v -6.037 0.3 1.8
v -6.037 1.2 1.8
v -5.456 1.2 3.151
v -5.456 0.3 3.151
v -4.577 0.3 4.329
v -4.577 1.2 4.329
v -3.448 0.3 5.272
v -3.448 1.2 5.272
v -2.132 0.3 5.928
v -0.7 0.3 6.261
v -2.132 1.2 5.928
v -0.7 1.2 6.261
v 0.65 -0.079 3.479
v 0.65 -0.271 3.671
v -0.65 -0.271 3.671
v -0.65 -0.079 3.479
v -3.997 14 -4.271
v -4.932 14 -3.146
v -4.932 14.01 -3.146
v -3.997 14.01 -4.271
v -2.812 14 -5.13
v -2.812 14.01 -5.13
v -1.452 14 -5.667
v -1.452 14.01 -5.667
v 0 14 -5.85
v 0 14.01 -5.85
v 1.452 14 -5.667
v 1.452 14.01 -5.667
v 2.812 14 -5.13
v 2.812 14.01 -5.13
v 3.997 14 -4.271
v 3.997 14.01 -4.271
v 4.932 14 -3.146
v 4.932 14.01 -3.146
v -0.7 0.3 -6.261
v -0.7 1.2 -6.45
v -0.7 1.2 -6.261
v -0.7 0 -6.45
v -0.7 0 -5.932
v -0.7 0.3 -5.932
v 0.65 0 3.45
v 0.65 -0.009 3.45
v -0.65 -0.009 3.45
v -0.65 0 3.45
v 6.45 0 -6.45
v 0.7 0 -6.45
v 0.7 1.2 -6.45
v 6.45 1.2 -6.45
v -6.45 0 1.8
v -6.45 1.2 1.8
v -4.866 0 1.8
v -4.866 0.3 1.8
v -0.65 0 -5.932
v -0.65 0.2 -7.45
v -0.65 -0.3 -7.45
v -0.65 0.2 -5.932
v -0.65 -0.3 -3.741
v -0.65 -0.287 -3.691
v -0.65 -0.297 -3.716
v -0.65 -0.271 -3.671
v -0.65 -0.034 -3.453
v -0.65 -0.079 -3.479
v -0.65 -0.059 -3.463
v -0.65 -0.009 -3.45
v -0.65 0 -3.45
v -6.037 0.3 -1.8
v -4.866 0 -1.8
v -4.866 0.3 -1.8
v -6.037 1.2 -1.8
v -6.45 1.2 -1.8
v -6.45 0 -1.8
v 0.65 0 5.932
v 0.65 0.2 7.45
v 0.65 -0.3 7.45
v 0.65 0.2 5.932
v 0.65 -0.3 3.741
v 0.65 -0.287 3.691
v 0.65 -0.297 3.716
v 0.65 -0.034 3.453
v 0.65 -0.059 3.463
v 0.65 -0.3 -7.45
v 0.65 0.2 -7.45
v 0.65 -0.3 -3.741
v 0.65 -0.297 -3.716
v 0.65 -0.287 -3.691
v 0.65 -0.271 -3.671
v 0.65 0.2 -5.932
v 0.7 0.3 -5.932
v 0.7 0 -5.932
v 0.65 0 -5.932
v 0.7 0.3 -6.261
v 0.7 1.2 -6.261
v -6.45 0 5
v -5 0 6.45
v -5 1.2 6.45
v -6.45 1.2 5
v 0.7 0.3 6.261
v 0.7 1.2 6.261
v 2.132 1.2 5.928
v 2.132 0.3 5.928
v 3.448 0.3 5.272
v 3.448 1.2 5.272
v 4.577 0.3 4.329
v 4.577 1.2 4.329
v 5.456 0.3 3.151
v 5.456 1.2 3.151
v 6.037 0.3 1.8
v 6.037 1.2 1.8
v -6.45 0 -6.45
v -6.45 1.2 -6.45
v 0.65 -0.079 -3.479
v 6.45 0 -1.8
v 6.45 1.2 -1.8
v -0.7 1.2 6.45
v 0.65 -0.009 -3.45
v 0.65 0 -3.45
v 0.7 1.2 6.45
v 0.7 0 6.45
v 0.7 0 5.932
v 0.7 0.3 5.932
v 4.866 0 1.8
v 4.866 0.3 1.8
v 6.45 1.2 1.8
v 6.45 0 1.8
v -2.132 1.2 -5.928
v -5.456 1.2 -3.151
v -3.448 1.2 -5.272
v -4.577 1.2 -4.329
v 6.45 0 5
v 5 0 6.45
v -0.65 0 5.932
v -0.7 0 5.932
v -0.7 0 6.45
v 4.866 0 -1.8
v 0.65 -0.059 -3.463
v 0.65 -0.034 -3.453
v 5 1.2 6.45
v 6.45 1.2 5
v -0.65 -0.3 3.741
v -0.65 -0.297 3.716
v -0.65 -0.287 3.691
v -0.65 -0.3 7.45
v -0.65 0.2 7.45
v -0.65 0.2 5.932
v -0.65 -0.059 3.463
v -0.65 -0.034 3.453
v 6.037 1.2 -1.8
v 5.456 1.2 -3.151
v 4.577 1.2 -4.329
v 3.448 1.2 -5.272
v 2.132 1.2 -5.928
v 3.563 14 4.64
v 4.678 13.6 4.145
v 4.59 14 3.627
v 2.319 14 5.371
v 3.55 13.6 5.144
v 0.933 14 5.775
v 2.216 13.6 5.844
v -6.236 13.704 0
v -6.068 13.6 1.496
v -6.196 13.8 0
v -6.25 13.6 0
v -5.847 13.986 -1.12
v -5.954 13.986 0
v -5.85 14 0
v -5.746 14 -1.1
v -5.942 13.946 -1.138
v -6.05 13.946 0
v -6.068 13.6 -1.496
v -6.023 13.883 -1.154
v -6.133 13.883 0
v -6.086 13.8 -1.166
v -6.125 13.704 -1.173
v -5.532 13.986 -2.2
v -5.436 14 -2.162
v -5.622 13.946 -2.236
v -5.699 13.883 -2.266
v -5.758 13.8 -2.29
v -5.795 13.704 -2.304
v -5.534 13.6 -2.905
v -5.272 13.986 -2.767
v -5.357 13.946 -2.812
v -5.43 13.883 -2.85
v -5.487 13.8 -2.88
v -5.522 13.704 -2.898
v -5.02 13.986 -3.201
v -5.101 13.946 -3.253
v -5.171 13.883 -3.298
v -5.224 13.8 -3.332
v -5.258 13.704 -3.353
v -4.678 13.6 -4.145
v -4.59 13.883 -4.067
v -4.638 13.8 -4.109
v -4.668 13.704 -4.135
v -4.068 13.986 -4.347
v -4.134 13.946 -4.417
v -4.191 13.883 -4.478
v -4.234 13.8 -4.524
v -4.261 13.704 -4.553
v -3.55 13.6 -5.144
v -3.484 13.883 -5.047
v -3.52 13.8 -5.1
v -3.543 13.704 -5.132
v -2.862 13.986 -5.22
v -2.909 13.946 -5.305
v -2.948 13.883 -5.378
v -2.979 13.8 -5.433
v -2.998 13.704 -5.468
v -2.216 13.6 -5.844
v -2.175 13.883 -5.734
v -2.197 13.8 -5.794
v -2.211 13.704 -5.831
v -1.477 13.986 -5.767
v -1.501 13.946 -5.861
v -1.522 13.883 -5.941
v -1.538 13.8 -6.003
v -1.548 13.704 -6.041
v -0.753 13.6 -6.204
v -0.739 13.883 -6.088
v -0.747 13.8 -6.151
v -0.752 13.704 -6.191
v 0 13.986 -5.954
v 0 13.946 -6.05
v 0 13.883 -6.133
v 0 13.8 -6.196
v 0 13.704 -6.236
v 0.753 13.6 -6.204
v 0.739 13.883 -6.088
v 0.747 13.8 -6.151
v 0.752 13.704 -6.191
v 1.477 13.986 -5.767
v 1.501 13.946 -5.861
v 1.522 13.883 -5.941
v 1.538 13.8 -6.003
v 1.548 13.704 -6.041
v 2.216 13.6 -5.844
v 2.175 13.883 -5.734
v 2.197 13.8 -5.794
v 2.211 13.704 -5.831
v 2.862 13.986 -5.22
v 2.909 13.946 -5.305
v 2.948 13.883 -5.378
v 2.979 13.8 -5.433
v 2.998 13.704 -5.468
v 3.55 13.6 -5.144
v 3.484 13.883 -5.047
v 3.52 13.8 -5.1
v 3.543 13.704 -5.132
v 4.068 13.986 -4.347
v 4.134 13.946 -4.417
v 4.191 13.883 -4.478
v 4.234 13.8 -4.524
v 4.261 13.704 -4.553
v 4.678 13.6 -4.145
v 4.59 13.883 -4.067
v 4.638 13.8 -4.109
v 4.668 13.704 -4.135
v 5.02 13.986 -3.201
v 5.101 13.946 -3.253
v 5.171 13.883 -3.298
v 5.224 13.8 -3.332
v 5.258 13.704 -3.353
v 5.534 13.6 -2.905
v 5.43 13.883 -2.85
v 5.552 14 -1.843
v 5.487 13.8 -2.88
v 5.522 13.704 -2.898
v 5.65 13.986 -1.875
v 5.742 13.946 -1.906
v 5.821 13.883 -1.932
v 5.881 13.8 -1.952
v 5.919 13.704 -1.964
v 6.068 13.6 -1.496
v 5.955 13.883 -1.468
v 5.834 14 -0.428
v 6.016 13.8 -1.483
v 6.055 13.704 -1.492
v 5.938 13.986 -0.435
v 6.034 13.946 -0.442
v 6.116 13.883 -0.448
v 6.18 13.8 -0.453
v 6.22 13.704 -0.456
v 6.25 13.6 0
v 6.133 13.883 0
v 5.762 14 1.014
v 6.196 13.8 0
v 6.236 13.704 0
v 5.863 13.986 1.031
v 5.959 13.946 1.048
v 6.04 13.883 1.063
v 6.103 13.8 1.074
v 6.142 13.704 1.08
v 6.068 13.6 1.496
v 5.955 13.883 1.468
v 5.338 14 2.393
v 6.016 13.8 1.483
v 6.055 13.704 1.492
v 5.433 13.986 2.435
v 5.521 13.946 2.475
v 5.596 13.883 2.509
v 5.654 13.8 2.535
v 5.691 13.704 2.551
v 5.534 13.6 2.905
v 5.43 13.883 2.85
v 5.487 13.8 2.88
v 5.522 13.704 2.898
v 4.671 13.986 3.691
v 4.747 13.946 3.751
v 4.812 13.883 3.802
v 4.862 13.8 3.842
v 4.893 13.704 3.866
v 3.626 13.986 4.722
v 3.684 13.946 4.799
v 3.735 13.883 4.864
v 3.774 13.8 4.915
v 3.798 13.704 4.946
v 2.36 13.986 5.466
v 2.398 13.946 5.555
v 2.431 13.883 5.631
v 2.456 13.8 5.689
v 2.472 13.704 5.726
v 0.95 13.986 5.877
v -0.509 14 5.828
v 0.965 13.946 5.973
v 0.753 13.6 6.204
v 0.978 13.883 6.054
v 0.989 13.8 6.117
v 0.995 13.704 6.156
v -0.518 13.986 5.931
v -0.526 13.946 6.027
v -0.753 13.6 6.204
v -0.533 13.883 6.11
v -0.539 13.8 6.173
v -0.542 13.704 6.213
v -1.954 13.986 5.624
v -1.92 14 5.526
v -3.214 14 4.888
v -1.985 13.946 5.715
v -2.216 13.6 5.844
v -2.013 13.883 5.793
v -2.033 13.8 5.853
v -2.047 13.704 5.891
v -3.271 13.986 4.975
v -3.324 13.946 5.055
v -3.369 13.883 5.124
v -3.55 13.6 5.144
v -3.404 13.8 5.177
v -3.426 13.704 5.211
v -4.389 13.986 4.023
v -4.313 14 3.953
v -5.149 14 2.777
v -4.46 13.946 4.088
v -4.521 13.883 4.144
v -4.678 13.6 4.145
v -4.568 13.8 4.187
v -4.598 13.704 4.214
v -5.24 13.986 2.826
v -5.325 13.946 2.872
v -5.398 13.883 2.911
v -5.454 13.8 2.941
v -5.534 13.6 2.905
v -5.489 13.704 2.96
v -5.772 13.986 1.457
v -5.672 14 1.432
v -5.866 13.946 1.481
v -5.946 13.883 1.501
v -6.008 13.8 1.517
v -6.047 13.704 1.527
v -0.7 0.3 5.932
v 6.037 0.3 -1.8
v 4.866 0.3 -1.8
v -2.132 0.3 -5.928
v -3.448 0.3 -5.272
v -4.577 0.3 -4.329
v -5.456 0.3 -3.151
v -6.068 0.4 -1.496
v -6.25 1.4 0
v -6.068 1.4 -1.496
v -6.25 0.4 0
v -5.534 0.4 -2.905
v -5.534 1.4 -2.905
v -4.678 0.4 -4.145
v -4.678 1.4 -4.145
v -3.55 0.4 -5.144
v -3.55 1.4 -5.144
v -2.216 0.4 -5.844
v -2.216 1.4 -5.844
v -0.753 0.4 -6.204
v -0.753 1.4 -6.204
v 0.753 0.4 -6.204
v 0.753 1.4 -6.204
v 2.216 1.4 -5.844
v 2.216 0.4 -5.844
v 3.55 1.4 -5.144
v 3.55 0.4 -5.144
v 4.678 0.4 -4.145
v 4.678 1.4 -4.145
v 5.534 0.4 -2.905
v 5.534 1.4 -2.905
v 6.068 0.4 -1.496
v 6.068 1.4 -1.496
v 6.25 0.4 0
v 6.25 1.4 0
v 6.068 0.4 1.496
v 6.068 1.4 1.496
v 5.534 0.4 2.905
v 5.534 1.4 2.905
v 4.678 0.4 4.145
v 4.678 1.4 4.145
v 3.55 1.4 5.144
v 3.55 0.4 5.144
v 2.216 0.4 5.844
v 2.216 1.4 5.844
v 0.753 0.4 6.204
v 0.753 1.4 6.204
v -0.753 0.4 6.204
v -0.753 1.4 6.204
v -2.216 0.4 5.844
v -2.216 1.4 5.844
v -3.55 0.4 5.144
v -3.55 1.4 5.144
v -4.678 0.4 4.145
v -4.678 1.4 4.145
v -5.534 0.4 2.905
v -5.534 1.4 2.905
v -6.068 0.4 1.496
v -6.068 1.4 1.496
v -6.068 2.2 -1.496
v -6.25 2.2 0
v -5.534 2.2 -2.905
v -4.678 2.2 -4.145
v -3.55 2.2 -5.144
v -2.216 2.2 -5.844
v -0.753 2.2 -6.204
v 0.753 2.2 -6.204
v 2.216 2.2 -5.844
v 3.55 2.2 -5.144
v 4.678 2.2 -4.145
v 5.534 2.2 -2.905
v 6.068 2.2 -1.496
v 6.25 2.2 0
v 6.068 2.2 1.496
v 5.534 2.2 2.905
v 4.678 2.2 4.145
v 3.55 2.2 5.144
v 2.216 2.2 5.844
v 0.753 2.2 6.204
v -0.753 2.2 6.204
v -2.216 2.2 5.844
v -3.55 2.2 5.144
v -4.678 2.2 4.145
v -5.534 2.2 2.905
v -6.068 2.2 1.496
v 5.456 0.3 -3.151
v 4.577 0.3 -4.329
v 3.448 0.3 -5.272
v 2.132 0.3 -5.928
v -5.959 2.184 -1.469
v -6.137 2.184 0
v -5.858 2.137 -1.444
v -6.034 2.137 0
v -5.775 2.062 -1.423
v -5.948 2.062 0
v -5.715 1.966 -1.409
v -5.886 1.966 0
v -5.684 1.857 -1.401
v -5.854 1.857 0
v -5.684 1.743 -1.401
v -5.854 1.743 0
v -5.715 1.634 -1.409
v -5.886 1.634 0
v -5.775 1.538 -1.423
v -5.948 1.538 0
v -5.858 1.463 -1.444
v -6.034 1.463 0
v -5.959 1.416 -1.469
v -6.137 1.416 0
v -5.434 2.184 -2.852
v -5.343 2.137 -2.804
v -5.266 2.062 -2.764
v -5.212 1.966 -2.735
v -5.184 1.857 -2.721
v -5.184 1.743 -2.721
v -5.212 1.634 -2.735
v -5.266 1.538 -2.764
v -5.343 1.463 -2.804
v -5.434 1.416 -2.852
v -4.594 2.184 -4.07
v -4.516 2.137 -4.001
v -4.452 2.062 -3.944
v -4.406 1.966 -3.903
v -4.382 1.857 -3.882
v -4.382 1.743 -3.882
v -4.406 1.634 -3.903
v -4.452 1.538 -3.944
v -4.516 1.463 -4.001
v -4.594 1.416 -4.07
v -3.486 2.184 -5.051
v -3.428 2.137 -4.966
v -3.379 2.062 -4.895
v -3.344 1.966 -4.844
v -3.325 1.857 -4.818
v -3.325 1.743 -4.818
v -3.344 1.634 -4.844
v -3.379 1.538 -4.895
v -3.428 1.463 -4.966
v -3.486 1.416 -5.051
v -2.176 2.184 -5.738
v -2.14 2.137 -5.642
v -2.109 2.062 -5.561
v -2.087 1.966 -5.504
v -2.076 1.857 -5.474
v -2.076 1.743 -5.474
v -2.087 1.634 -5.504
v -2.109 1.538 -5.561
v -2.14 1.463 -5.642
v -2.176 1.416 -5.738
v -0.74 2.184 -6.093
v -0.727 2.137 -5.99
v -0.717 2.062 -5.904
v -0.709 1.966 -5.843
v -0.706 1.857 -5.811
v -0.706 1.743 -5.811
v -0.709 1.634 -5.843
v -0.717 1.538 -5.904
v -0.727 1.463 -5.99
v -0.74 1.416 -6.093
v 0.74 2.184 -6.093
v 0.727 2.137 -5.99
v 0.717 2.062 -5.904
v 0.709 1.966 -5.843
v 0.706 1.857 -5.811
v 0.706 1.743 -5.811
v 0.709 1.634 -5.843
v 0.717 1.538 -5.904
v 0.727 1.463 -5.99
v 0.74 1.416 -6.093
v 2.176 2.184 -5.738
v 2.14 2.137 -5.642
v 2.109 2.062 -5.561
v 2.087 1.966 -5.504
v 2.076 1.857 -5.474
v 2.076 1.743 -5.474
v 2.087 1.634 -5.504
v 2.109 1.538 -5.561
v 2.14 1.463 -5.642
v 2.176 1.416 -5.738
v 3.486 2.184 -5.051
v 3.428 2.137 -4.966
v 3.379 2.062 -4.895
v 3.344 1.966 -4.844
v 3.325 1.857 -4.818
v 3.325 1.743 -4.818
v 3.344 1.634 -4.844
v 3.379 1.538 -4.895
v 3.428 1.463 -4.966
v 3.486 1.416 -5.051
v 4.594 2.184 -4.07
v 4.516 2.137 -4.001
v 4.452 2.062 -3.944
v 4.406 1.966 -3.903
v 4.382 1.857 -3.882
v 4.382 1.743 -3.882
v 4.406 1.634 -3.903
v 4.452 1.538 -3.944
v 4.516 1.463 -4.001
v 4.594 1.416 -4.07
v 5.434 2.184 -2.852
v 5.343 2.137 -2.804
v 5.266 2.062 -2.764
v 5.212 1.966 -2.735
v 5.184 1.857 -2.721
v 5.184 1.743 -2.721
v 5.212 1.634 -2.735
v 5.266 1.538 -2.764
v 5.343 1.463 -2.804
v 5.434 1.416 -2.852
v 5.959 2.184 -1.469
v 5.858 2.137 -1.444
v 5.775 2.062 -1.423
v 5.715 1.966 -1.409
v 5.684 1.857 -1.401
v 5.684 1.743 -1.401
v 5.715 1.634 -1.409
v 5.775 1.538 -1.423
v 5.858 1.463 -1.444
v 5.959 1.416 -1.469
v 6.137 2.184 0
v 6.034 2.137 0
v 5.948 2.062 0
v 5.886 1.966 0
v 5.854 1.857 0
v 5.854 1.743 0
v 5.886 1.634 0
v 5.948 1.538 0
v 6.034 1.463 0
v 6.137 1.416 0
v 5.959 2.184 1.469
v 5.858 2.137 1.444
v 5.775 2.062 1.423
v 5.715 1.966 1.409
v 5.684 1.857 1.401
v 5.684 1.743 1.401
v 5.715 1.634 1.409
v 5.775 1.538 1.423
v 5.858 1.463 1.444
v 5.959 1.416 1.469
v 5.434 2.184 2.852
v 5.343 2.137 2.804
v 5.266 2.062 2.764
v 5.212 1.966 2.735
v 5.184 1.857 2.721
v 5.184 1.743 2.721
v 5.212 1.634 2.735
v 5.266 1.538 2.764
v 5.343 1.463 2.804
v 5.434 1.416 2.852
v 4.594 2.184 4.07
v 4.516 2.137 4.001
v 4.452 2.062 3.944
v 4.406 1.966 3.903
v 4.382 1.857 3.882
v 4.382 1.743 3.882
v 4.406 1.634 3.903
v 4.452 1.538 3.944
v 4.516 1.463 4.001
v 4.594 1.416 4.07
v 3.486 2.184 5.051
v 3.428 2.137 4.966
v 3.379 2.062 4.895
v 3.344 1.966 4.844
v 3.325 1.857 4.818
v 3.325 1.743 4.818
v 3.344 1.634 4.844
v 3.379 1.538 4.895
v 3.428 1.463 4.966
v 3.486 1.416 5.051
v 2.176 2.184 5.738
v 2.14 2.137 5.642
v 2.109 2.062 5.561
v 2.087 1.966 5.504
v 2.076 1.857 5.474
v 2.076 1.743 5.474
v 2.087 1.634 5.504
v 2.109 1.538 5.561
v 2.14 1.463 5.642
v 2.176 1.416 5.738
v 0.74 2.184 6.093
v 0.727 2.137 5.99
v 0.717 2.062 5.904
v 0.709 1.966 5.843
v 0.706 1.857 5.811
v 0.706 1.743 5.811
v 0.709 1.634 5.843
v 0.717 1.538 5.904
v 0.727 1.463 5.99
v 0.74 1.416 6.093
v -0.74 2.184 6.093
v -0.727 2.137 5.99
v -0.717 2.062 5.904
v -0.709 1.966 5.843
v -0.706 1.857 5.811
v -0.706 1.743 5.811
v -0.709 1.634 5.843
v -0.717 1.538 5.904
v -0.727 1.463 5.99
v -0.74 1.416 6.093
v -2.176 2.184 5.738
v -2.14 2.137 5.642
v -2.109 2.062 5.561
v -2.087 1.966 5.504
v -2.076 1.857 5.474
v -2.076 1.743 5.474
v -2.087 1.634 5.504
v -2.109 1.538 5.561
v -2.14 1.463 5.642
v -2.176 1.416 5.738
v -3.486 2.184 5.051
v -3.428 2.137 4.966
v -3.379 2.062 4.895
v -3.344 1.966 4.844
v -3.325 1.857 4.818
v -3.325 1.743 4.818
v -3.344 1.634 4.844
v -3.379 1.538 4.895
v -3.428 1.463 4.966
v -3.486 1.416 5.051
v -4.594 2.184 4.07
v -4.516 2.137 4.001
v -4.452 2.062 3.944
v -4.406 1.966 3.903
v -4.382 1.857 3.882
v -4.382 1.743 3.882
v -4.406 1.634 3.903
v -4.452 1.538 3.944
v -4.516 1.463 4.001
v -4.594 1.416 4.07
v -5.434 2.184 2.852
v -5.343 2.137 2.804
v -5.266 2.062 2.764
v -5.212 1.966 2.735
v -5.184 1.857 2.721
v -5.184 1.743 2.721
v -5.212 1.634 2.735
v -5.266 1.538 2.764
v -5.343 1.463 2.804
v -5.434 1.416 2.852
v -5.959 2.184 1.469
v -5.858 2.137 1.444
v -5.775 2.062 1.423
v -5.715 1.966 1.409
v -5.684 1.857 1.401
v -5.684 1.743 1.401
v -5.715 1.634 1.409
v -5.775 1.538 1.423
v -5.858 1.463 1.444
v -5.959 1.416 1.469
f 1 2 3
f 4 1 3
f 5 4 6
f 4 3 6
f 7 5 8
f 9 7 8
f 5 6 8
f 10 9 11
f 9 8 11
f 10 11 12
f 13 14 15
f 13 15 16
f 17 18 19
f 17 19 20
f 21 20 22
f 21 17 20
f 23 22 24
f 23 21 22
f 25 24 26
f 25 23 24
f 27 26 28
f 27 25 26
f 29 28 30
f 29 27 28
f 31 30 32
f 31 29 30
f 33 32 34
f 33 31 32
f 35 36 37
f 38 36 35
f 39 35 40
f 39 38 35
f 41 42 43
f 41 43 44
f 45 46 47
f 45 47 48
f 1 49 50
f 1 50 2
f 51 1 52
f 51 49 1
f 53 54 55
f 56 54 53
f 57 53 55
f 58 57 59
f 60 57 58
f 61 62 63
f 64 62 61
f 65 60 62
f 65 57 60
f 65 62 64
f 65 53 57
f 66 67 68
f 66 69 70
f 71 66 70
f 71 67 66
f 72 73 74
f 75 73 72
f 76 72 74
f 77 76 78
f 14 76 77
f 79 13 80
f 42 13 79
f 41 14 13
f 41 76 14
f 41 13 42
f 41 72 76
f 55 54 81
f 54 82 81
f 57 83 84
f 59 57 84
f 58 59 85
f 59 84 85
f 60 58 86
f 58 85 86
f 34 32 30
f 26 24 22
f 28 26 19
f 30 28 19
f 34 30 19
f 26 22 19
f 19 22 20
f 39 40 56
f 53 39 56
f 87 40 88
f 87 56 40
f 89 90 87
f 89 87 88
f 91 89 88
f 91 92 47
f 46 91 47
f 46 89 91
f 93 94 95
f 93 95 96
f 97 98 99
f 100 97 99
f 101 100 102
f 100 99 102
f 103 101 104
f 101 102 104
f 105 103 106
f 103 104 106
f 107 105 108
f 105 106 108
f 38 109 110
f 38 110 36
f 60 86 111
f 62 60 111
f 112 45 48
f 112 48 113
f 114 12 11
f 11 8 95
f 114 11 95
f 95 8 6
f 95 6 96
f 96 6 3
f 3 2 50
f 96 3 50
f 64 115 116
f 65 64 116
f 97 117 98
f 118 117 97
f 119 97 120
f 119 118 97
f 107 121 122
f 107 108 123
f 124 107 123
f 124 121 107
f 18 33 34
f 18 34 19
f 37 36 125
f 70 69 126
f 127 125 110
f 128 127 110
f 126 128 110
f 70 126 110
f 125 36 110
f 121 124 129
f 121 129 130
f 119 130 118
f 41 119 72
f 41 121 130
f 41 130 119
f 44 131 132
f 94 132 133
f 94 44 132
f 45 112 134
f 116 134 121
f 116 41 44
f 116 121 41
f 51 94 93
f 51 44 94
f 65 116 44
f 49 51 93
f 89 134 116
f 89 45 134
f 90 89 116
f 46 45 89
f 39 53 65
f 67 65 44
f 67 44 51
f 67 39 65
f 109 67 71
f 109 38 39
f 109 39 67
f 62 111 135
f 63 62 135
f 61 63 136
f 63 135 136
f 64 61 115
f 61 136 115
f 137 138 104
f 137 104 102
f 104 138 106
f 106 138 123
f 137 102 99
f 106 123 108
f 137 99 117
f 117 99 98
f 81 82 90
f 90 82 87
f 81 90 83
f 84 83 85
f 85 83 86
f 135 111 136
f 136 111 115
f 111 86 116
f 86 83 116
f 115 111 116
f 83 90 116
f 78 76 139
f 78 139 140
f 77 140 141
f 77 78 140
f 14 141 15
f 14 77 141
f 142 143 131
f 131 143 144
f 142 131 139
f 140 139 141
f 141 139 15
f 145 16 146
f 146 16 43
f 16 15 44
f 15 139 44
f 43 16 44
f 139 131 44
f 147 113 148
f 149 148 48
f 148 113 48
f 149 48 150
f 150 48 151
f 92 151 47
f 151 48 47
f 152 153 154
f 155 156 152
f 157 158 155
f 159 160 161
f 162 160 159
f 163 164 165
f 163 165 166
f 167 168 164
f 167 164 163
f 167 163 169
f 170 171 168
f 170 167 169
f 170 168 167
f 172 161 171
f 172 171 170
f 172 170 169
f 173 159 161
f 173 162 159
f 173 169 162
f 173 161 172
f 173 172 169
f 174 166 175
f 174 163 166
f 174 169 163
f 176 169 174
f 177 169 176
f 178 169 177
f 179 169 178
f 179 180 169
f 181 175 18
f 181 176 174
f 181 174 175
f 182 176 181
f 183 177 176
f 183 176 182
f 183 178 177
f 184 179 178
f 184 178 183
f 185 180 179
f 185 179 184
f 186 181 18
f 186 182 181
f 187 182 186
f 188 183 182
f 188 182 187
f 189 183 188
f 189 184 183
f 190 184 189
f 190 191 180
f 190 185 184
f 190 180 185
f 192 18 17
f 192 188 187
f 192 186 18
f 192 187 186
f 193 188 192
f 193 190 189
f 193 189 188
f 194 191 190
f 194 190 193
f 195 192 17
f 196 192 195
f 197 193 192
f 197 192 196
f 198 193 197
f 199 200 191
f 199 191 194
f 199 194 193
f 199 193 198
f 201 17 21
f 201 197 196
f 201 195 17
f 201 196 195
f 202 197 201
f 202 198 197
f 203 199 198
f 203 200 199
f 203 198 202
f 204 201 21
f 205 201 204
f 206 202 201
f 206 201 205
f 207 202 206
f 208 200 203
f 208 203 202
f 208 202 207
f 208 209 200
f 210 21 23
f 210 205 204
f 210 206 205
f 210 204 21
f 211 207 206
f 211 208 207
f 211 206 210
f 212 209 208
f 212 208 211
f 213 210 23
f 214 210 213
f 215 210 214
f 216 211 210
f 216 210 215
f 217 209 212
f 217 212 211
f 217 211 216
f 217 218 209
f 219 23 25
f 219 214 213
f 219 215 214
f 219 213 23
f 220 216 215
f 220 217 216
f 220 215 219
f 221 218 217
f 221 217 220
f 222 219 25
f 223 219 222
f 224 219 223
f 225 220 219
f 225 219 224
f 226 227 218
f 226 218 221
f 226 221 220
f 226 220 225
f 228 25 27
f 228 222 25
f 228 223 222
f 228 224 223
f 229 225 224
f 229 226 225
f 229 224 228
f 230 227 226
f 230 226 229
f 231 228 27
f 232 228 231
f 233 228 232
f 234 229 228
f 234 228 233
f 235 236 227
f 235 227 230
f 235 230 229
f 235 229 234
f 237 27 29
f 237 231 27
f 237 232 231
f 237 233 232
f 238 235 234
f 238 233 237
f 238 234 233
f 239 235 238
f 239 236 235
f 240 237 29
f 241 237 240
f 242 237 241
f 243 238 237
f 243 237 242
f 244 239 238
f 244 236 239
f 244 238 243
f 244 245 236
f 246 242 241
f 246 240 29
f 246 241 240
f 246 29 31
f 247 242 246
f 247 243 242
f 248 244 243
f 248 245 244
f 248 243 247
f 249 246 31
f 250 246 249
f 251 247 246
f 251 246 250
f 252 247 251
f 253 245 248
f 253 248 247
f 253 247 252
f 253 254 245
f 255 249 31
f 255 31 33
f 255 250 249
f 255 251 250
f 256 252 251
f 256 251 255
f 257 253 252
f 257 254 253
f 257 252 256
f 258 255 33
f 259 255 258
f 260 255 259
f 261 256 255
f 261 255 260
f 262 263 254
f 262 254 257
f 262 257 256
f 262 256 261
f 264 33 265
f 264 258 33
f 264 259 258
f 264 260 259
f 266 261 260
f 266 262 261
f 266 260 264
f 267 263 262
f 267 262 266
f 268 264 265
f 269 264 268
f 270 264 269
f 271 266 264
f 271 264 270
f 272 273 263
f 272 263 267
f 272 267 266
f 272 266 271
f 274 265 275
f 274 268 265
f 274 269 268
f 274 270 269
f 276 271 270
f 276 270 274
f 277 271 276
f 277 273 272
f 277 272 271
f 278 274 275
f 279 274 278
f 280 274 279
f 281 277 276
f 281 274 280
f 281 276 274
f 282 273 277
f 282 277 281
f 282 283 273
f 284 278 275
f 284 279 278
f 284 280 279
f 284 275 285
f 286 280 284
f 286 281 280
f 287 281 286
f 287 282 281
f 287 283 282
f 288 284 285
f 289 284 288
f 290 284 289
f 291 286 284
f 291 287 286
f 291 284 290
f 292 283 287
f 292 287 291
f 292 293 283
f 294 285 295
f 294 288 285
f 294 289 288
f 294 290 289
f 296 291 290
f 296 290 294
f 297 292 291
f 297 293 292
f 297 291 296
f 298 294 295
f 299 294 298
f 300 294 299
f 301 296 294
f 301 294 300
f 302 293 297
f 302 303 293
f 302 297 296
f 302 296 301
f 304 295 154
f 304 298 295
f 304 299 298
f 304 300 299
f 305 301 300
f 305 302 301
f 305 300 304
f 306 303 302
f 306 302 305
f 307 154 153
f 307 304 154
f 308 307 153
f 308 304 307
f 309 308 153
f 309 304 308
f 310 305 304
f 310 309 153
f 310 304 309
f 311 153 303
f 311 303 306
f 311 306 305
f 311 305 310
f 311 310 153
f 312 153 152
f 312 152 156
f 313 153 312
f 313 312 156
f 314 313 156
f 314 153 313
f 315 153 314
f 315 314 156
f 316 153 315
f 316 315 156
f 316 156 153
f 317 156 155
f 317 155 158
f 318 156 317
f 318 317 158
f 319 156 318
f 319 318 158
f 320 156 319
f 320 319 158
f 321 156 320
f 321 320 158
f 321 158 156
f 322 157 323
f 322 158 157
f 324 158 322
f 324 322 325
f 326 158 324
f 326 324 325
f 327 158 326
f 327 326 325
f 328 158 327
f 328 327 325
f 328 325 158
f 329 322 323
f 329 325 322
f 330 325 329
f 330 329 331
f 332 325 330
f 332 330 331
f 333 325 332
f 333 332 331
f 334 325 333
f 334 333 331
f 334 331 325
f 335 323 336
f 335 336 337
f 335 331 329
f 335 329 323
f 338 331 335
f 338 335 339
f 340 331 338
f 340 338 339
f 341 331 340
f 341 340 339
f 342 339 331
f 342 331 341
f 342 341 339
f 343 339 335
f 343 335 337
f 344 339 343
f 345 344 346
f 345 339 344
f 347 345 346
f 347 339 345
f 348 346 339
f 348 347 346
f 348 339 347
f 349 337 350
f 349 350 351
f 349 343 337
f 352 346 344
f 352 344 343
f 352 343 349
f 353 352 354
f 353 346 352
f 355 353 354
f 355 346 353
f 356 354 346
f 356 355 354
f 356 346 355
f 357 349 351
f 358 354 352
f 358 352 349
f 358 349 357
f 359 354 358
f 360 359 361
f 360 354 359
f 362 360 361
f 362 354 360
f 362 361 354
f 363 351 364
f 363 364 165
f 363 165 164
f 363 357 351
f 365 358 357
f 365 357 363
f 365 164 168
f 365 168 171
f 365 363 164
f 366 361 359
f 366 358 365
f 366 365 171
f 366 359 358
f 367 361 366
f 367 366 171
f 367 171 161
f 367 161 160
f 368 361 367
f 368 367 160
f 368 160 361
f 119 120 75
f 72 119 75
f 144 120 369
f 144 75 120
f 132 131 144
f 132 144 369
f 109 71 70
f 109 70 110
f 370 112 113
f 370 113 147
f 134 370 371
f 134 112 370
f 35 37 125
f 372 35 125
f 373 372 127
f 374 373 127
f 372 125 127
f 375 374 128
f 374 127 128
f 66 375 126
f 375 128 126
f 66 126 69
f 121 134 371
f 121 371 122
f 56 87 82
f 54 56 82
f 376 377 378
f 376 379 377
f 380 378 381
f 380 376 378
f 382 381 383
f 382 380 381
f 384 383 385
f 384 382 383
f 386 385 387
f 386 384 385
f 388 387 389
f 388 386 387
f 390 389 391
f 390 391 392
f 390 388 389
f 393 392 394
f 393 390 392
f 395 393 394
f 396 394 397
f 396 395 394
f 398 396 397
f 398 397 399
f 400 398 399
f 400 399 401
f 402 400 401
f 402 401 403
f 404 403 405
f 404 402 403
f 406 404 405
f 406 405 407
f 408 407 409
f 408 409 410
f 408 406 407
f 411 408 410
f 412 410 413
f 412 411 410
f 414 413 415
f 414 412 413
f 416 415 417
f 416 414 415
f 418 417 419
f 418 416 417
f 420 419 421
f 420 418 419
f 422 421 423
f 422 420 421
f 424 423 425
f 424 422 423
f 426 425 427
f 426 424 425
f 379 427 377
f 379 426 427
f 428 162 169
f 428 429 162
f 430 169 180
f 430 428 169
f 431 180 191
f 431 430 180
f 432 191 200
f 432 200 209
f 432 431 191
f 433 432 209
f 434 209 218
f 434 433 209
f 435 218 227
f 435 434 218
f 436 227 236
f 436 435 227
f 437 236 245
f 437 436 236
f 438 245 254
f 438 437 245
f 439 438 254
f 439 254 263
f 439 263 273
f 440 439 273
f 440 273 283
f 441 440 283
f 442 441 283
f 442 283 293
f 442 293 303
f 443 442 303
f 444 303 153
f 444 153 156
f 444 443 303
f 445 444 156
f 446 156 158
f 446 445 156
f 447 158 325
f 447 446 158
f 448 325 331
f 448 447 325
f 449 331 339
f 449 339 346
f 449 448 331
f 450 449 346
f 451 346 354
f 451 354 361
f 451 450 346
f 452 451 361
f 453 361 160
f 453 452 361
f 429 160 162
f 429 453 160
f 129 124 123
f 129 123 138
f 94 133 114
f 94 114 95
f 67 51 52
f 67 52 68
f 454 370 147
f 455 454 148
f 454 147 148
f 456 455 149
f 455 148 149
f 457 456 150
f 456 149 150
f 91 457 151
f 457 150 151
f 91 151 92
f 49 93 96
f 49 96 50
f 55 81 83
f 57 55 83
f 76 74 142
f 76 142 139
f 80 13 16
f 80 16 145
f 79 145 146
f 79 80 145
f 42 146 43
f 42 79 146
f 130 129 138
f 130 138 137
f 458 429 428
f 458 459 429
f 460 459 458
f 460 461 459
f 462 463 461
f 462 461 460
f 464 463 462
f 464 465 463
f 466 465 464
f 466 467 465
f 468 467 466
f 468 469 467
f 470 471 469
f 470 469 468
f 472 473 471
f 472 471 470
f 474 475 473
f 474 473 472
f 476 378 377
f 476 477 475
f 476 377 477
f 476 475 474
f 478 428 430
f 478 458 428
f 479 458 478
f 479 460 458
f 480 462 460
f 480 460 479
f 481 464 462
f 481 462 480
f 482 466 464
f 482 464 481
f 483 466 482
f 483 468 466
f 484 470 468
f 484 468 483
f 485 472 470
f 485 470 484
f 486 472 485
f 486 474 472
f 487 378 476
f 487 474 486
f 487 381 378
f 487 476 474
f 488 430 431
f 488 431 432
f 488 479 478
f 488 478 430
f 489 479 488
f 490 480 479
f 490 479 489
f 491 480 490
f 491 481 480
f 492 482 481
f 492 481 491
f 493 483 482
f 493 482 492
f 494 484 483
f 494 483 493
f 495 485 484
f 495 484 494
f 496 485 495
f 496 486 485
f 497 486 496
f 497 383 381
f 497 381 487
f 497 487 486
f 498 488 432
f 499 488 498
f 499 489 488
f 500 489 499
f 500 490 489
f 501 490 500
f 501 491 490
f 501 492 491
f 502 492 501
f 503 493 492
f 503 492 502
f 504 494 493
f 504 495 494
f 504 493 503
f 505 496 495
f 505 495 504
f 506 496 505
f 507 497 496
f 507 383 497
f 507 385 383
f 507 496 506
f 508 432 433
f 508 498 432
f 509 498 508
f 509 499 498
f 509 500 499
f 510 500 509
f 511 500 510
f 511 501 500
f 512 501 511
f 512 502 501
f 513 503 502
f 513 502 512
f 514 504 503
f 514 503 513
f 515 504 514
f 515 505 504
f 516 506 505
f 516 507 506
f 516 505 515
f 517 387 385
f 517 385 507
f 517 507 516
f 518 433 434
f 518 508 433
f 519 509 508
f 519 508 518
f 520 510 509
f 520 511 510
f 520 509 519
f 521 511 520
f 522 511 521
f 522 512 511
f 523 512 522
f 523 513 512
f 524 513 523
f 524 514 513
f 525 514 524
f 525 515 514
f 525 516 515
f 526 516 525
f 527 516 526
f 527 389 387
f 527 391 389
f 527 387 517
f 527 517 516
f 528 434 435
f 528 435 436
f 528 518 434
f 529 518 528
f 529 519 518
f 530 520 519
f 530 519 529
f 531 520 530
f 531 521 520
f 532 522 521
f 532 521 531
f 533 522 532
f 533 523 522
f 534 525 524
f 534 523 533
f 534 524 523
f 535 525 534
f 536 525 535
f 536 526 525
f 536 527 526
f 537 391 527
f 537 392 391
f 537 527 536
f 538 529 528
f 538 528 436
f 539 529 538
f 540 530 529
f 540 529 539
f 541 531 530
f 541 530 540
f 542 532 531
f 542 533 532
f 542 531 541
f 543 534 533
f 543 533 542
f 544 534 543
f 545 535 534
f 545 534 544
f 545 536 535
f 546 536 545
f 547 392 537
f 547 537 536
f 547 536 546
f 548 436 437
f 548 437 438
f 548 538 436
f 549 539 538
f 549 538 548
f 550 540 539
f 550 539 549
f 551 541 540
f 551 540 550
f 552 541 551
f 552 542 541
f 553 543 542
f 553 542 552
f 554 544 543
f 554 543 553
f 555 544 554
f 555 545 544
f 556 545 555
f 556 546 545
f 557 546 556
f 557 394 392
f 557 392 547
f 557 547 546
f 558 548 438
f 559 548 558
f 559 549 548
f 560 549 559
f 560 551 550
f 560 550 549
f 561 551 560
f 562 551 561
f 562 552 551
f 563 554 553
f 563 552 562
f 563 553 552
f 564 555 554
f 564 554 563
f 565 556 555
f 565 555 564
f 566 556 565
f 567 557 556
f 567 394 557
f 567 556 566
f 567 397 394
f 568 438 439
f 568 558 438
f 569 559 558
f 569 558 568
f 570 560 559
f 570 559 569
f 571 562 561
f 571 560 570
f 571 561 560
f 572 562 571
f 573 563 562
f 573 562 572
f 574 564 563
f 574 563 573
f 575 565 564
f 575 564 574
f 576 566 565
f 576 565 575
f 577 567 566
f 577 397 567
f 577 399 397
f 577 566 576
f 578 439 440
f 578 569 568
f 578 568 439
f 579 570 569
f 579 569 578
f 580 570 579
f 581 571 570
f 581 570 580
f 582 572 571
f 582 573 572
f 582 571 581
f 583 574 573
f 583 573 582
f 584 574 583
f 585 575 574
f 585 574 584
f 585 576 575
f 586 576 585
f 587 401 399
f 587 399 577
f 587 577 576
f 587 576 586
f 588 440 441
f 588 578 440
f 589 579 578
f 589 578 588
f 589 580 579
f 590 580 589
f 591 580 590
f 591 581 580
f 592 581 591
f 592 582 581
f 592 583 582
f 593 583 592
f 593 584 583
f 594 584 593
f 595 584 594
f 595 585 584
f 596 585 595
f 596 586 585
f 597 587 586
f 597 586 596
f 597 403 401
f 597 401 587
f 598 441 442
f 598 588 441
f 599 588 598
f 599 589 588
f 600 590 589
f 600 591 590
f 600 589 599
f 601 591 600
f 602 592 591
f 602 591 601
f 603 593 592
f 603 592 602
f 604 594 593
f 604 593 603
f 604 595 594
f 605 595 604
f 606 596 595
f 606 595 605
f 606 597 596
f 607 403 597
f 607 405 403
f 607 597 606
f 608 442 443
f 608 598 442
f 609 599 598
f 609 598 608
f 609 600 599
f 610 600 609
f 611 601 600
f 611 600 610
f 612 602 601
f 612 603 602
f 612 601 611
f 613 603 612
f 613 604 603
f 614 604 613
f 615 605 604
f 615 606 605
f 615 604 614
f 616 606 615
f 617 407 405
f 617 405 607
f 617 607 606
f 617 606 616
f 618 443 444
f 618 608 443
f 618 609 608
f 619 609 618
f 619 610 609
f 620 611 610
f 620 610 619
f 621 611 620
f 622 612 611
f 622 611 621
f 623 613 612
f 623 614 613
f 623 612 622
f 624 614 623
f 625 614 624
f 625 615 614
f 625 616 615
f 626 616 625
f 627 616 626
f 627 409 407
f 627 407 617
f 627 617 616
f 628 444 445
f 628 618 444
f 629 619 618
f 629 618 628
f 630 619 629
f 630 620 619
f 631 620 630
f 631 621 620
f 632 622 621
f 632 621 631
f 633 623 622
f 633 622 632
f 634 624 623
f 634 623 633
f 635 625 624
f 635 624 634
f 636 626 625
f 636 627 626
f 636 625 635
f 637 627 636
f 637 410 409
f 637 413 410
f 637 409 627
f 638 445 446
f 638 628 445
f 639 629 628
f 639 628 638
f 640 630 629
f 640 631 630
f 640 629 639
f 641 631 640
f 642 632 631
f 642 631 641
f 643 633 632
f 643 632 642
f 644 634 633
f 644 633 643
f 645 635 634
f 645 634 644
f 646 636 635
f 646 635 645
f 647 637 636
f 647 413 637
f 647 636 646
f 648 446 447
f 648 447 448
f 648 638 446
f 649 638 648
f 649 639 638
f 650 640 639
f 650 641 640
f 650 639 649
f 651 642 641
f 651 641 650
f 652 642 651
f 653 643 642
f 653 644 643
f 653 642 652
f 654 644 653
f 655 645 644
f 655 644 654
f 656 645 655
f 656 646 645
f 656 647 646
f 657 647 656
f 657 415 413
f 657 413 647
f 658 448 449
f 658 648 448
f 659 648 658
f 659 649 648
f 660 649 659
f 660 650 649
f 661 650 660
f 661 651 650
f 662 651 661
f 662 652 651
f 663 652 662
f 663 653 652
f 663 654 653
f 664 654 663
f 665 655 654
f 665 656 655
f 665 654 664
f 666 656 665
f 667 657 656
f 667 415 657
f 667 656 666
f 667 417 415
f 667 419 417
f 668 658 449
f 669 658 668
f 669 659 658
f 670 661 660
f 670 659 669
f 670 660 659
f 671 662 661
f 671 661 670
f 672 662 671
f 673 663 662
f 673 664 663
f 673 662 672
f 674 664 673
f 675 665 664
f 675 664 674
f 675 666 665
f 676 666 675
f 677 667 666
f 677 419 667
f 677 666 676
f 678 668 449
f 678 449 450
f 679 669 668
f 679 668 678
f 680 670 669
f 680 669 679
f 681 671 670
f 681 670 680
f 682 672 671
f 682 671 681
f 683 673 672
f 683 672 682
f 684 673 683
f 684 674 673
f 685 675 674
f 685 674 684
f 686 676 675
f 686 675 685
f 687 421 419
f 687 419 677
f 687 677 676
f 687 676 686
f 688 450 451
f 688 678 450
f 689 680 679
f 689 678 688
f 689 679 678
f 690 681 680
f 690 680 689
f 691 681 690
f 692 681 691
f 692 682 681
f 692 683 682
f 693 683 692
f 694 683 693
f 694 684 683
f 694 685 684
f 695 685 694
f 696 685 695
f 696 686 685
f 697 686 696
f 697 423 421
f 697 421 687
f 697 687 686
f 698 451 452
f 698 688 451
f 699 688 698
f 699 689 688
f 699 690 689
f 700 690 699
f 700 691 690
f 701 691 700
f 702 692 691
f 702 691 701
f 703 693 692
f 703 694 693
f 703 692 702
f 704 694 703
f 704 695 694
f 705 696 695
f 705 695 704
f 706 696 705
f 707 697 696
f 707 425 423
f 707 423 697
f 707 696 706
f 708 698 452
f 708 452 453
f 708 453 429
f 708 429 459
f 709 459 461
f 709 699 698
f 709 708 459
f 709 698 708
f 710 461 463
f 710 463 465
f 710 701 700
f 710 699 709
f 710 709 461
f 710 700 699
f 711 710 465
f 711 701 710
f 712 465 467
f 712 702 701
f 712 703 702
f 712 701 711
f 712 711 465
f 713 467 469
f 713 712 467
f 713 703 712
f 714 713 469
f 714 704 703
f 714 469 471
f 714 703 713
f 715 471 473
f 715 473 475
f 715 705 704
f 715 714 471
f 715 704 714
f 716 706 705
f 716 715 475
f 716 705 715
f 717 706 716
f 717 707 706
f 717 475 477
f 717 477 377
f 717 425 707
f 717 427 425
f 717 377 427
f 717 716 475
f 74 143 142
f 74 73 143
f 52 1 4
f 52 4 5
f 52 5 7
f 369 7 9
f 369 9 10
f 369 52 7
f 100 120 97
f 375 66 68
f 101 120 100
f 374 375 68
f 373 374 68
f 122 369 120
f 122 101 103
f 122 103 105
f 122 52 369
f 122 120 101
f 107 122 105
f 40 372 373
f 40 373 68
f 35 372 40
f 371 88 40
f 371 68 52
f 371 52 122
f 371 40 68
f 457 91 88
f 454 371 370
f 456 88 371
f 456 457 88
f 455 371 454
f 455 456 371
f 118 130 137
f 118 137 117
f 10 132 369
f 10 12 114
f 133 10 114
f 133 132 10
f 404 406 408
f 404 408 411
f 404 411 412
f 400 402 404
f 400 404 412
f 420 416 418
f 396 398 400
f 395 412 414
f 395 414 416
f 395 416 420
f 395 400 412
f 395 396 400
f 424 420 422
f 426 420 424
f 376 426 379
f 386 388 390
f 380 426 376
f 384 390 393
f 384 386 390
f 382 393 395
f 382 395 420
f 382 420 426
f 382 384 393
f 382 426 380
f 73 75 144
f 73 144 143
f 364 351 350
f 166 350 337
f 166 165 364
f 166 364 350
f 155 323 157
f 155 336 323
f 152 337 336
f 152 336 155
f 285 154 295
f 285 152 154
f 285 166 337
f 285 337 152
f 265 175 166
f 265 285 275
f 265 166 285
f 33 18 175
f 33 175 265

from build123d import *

# Parameters (mm, degrees)
BOSS_EXTRUDE1_DEPTH = 1.2
CUT_EXTRUDE1_START  = 1.2
SKETCH4_R           = 6.3
CUT_EXTRUDE1_DEPTH  = 0.9
BOSS_EXTRUDE2_DEPTH = 0.65
BOSS_EXTRUDE3_DEPTH = 0.01


with BuildPart() as part:
    # Sketch1 → Boss-Extrude1 (new body)
    with BuildSketch(Plane(origin=(0, 0, 0), x_dir=(1, 0, 0), z_dir=(0, 1, 0))):
        Polygon((-6.45, 6.45), (-0.7, 6.45), (-0.7, 5.932376892), (0.7, 5.932376892), (0.7, 6.45), (6.45, 6.45), (6.45, 1.8), (4.866153182, 1.8), (4.866153182, -1.8), (6.45, -1.8), (6.45, -5), (5, -6.45), (0.7, -6.45), (0.7, -5.932376892), (-0.7, -5.932376892), (-0.7, -6.45), (-5, -6.45), (-6.45, -5), (-6.45, -1.8), (-4.866153182, -1.8), (-4.866153182, 1.8), (-6.45, 1.8), align=None)
    extrude(amount=BOSS_EXTRUDE1_DEPTH)

    # Sketch4 → Cut-Extrude1 (cut)
    with BuildSketch(Plane(origin=(0, 0, 0), x_dir=(1, 0, 0), z_dir=(0, 1, 0)).offset(CUT_EXTRUDE1_START)):
        Circle(SKETCH4_R)
    extrude(amount=-CUT_EXTRUDE1_DEPTH, mode=Mode.SUBTRACT)

    # Sketch5 → Boss-Extrude2 (add, symmetric)
    with BuildSketch(Plane(origin=(0, 0, 0), x_dir=(0, 0, -1), z_dir=(1, 0, 0))):
        with BuildLine():
            Line((-7.45, 0.2), (-7.45, -0.3))
            Line((-7.45, -0.3), (-3.741421356, -0.3))
            ThreePointArc((-3.741421356, -0.3), (-3.703153013, -0.292387953), (-3.670710678, -0.270710678))
            Line((-3.670710678, -0.270710678), (-3.479289322, -0.079289322))
            ThreePointArc((-3.479289322, -0.079289322), (-3.457612047, -0.046846987), (-3.45, -0.008578644))
            Line((-3.45, -0.008578644), (-3.45, 0.2))
            Line((-3.45, 0.2), (-7.45, 0.2))
        make_face()
    boss_extrude2 = extrude(amount=BOSS_EXTRUDE2_DEPTH, both=True)

    # Mirror1: Boss-Extrude2 across plane
    add(boss_extrude2.mirror(Plane.XY))


with BuildPart() as body_2:
    # Sketch3 → Revolve1 (revolve)
    with BuildSketch(Plane.XY):
        with BuildLine():
            Line((-6.25, 13.6), (-6.25, 2.2))
            ThreePointArc((-6.25, 2.2), (-5.85, 1.8), (-6.25, 1.4))
            Line((-6.25, 1.4), (-6.25, 0.4))
            Line((-6.25, 0.4), (0, 0.4))
            Line((0, 0.4), (0, 14))
            Line((0, 14), (-5.85, 14))
            ThreePointArc((-5.85, 14), (-6.132842712, 13.882842712), (-6.25, 13.6))
        make_face()
    revolve(axis=Axis((0, 22.223469288, 0), (0, -1, 0)))

    # Sketch6 → Boss-Extrude3 (add)
    with BuildSketch(Plane(origin=(0, 14, 0), x_dir=(1, 0, 0), z_dir=(0, 1, 0))):
        with BuildLine():
            Line((4.932243179, 3.145707746), (-4.932243179, 3.145707746))
            ThreePointArc((-4.932243179, 3.145707746), (0, 5.85), (4.932243179, 3.145707746))
        make_face()
    extrude(amount=BOSS_EXTRUDE3_DEPTH)


solid = Compound([part.part, body_2.part])
